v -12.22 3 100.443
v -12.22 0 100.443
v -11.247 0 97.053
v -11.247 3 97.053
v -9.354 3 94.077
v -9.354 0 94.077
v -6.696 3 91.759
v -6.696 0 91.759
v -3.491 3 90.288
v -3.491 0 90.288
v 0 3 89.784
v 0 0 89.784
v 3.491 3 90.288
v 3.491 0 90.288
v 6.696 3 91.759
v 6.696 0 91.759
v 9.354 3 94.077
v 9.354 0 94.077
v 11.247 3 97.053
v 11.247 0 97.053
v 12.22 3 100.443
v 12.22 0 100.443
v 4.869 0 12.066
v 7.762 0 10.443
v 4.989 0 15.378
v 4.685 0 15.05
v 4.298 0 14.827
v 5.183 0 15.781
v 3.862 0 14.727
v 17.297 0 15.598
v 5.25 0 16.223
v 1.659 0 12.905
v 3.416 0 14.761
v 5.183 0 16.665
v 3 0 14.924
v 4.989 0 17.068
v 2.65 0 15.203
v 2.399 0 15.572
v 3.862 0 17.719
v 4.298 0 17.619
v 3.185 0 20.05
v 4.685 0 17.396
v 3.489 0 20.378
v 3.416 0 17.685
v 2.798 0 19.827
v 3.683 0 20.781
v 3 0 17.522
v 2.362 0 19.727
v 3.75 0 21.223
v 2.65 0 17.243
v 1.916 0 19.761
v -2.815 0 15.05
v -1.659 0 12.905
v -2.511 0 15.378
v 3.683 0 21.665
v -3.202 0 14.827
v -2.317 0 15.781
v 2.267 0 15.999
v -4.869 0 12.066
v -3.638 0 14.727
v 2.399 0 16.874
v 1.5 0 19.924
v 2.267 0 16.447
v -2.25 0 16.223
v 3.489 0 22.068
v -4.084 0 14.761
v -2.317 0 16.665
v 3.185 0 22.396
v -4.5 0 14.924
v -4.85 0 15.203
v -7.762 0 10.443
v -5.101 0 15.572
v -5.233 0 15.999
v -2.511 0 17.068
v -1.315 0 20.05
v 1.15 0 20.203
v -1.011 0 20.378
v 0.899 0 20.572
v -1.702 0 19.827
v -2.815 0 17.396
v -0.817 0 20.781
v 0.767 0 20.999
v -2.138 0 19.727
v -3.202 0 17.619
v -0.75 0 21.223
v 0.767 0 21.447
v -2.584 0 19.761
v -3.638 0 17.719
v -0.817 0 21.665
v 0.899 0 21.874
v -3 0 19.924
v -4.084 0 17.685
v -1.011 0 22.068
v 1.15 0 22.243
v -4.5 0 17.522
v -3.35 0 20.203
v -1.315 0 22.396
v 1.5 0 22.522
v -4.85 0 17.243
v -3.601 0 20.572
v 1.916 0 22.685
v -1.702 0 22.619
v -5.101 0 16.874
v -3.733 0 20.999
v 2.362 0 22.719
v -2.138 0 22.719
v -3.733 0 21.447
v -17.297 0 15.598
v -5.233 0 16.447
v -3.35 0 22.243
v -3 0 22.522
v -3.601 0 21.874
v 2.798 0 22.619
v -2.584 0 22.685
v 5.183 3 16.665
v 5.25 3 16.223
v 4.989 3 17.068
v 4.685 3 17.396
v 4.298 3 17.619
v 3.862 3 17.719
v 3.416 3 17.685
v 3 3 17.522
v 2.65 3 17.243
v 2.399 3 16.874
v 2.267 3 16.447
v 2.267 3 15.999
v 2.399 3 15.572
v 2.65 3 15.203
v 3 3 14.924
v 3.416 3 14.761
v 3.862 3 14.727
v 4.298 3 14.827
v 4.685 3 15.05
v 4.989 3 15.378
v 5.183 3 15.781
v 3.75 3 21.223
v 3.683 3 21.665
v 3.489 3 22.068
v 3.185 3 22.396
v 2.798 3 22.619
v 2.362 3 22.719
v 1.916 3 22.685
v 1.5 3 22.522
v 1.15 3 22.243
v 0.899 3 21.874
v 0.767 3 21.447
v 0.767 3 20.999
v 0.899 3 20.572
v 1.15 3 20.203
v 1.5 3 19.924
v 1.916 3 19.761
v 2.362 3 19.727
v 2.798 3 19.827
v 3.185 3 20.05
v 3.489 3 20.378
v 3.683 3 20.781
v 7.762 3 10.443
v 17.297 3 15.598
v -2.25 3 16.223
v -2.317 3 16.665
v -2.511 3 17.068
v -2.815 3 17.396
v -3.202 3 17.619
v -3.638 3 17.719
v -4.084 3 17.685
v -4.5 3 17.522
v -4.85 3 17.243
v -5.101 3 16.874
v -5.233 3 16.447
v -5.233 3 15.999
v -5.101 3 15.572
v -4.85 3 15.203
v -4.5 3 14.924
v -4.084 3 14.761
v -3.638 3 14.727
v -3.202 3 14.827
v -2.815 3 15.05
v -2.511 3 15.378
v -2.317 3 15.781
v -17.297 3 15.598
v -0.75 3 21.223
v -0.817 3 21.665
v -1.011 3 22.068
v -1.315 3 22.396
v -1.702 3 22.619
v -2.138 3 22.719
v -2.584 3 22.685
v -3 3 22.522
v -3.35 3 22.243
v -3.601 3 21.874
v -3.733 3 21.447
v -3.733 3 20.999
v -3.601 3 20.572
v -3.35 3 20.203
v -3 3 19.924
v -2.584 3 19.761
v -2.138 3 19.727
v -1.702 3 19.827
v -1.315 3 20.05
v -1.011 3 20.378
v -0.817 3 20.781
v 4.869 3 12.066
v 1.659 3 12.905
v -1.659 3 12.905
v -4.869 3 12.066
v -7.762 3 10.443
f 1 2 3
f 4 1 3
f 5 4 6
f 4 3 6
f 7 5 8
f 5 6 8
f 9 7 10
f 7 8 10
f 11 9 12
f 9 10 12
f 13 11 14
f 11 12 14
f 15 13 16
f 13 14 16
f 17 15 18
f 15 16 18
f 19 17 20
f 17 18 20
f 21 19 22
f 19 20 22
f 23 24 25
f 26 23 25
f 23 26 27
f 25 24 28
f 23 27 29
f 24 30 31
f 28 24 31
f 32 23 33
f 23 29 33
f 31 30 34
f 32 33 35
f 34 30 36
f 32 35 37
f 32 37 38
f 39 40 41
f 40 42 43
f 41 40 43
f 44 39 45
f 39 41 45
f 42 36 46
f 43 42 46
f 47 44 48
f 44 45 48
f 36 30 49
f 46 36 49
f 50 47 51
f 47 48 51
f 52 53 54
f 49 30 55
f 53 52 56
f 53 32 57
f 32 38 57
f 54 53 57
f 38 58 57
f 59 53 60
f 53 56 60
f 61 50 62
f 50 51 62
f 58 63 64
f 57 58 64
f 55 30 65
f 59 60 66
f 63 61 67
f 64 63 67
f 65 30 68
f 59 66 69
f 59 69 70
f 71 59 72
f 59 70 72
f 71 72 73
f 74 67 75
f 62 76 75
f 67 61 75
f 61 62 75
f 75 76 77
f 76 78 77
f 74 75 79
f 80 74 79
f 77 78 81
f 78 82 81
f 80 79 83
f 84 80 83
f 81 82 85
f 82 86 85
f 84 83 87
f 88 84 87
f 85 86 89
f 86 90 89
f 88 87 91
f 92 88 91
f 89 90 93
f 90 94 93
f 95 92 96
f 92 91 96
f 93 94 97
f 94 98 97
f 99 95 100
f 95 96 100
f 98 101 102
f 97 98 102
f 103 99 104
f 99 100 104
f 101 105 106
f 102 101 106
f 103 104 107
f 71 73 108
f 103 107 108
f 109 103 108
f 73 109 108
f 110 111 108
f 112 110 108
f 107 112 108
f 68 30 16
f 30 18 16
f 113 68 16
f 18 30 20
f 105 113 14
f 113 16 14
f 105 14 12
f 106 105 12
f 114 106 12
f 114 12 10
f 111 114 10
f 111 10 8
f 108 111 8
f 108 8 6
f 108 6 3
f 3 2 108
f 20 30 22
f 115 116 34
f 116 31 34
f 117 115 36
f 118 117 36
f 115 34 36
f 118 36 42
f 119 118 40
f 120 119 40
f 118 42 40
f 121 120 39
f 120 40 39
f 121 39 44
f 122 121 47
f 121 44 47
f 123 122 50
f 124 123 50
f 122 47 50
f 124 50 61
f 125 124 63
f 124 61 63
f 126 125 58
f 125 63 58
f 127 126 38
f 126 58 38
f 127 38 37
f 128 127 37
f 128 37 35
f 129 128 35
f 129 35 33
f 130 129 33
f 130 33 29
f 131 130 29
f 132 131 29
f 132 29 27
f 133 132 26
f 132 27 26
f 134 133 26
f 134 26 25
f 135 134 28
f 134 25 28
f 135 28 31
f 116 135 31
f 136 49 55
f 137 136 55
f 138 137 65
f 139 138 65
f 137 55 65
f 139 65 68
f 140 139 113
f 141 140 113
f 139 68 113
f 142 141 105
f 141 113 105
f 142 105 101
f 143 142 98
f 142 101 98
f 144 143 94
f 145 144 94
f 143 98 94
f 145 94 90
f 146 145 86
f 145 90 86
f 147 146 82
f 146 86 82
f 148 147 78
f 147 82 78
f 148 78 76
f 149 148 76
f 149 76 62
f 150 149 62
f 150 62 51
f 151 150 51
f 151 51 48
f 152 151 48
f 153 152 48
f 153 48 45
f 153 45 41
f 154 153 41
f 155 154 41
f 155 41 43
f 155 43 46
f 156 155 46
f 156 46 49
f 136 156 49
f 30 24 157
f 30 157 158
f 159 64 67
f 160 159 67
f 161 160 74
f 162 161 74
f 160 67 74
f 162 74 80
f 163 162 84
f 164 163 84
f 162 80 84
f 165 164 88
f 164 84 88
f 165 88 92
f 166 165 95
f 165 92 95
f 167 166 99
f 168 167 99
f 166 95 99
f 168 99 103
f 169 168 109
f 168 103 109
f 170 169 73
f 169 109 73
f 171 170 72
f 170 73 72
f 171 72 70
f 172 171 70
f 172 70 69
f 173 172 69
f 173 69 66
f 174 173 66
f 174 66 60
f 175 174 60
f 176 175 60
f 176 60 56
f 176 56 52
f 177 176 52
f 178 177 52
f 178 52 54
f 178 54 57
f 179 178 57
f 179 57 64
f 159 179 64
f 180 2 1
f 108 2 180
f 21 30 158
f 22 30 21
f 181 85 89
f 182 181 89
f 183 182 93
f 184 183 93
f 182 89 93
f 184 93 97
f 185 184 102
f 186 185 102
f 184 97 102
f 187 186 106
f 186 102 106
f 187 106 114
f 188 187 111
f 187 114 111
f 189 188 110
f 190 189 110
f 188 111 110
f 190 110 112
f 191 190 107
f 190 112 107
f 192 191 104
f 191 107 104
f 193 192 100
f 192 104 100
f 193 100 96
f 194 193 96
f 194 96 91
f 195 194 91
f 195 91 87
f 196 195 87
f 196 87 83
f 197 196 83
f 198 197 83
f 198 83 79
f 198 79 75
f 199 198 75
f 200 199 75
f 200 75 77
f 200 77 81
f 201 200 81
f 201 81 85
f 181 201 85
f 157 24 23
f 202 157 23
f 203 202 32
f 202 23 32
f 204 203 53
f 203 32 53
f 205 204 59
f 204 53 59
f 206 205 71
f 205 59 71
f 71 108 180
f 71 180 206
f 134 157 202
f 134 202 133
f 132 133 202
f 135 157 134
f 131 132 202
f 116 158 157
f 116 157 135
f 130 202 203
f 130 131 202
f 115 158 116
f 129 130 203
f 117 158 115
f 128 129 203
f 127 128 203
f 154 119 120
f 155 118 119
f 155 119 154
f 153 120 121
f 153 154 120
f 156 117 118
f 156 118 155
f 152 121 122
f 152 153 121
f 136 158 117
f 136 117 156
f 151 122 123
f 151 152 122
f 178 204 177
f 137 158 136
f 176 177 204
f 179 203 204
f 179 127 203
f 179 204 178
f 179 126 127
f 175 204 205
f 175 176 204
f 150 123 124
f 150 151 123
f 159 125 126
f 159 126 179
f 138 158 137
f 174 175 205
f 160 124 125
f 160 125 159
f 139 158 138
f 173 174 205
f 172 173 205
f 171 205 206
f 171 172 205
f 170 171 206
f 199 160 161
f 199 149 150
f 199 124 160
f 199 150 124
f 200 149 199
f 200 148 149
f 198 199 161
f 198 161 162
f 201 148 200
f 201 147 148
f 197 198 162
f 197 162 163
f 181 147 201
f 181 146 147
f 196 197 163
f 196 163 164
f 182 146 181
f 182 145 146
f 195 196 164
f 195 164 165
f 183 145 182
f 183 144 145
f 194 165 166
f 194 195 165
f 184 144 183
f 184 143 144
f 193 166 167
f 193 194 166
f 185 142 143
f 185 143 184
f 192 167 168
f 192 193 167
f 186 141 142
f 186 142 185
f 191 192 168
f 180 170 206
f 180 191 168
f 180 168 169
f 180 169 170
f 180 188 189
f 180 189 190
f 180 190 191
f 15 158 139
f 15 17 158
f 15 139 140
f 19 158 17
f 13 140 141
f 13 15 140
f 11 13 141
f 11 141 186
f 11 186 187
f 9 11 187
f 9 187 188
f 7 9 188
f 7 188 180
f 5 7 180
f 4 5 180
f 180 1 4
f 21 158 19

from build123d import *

# Parameters (mm, degrees)
SKETCH011_R  = 1.5
PAD004_DEPTH = 10
PAD002_DEPTH = 3


with BuildPart() as armmountcutout:
    # Sketch011 → Pad004 (new body, symmetric)
    with BuildSketch(Plane.XZ):
        with Locations((-2.25, 21.222956)):
            Circle(SKETCH011_R)
        with Locations((-3.75, 16.222956)):
            Circle(SKETCH011_R)
        with Locations((2.25, 21.222956)):
            Circle(SKETCH011_R)
        with Locations((3.75, 16.222956)):
            Circle(SKETCH011_R)
    extrude(amount=PAD004_DEPTH, both=True)


with BuildPart() as cut002:
    # Sketch009 → Pad002 (new body)
    with BuildSketch(Plane.XZ):
        with BuildLine():
            ThreePointArc((7.761952, 10.442802), (0, 13.011534), (-7.761952, 10.442802))
            Line((-17.297442, 15.597632), (-7.761952, 10.442802))
            Line((-12.220397, 100.442802), (-17.297442, 15.597632))
            ThreePointArc((-12.220397, 100.442802), (0, 89.783571), (12.220397, 100.442802))
            Line((17.297442, 15.597632), (12.220397, 100.442802))
            Line((7.761952, 10.442802), (17.297442, 15.597632))
        make_face()
    extrude(amount=-PAD002_DEPTH)

    # Cut002: cut ArmMountCutout
    add(armmountcutout.part, mode=Mode.SUBTRACT)


solid = cut002.part
